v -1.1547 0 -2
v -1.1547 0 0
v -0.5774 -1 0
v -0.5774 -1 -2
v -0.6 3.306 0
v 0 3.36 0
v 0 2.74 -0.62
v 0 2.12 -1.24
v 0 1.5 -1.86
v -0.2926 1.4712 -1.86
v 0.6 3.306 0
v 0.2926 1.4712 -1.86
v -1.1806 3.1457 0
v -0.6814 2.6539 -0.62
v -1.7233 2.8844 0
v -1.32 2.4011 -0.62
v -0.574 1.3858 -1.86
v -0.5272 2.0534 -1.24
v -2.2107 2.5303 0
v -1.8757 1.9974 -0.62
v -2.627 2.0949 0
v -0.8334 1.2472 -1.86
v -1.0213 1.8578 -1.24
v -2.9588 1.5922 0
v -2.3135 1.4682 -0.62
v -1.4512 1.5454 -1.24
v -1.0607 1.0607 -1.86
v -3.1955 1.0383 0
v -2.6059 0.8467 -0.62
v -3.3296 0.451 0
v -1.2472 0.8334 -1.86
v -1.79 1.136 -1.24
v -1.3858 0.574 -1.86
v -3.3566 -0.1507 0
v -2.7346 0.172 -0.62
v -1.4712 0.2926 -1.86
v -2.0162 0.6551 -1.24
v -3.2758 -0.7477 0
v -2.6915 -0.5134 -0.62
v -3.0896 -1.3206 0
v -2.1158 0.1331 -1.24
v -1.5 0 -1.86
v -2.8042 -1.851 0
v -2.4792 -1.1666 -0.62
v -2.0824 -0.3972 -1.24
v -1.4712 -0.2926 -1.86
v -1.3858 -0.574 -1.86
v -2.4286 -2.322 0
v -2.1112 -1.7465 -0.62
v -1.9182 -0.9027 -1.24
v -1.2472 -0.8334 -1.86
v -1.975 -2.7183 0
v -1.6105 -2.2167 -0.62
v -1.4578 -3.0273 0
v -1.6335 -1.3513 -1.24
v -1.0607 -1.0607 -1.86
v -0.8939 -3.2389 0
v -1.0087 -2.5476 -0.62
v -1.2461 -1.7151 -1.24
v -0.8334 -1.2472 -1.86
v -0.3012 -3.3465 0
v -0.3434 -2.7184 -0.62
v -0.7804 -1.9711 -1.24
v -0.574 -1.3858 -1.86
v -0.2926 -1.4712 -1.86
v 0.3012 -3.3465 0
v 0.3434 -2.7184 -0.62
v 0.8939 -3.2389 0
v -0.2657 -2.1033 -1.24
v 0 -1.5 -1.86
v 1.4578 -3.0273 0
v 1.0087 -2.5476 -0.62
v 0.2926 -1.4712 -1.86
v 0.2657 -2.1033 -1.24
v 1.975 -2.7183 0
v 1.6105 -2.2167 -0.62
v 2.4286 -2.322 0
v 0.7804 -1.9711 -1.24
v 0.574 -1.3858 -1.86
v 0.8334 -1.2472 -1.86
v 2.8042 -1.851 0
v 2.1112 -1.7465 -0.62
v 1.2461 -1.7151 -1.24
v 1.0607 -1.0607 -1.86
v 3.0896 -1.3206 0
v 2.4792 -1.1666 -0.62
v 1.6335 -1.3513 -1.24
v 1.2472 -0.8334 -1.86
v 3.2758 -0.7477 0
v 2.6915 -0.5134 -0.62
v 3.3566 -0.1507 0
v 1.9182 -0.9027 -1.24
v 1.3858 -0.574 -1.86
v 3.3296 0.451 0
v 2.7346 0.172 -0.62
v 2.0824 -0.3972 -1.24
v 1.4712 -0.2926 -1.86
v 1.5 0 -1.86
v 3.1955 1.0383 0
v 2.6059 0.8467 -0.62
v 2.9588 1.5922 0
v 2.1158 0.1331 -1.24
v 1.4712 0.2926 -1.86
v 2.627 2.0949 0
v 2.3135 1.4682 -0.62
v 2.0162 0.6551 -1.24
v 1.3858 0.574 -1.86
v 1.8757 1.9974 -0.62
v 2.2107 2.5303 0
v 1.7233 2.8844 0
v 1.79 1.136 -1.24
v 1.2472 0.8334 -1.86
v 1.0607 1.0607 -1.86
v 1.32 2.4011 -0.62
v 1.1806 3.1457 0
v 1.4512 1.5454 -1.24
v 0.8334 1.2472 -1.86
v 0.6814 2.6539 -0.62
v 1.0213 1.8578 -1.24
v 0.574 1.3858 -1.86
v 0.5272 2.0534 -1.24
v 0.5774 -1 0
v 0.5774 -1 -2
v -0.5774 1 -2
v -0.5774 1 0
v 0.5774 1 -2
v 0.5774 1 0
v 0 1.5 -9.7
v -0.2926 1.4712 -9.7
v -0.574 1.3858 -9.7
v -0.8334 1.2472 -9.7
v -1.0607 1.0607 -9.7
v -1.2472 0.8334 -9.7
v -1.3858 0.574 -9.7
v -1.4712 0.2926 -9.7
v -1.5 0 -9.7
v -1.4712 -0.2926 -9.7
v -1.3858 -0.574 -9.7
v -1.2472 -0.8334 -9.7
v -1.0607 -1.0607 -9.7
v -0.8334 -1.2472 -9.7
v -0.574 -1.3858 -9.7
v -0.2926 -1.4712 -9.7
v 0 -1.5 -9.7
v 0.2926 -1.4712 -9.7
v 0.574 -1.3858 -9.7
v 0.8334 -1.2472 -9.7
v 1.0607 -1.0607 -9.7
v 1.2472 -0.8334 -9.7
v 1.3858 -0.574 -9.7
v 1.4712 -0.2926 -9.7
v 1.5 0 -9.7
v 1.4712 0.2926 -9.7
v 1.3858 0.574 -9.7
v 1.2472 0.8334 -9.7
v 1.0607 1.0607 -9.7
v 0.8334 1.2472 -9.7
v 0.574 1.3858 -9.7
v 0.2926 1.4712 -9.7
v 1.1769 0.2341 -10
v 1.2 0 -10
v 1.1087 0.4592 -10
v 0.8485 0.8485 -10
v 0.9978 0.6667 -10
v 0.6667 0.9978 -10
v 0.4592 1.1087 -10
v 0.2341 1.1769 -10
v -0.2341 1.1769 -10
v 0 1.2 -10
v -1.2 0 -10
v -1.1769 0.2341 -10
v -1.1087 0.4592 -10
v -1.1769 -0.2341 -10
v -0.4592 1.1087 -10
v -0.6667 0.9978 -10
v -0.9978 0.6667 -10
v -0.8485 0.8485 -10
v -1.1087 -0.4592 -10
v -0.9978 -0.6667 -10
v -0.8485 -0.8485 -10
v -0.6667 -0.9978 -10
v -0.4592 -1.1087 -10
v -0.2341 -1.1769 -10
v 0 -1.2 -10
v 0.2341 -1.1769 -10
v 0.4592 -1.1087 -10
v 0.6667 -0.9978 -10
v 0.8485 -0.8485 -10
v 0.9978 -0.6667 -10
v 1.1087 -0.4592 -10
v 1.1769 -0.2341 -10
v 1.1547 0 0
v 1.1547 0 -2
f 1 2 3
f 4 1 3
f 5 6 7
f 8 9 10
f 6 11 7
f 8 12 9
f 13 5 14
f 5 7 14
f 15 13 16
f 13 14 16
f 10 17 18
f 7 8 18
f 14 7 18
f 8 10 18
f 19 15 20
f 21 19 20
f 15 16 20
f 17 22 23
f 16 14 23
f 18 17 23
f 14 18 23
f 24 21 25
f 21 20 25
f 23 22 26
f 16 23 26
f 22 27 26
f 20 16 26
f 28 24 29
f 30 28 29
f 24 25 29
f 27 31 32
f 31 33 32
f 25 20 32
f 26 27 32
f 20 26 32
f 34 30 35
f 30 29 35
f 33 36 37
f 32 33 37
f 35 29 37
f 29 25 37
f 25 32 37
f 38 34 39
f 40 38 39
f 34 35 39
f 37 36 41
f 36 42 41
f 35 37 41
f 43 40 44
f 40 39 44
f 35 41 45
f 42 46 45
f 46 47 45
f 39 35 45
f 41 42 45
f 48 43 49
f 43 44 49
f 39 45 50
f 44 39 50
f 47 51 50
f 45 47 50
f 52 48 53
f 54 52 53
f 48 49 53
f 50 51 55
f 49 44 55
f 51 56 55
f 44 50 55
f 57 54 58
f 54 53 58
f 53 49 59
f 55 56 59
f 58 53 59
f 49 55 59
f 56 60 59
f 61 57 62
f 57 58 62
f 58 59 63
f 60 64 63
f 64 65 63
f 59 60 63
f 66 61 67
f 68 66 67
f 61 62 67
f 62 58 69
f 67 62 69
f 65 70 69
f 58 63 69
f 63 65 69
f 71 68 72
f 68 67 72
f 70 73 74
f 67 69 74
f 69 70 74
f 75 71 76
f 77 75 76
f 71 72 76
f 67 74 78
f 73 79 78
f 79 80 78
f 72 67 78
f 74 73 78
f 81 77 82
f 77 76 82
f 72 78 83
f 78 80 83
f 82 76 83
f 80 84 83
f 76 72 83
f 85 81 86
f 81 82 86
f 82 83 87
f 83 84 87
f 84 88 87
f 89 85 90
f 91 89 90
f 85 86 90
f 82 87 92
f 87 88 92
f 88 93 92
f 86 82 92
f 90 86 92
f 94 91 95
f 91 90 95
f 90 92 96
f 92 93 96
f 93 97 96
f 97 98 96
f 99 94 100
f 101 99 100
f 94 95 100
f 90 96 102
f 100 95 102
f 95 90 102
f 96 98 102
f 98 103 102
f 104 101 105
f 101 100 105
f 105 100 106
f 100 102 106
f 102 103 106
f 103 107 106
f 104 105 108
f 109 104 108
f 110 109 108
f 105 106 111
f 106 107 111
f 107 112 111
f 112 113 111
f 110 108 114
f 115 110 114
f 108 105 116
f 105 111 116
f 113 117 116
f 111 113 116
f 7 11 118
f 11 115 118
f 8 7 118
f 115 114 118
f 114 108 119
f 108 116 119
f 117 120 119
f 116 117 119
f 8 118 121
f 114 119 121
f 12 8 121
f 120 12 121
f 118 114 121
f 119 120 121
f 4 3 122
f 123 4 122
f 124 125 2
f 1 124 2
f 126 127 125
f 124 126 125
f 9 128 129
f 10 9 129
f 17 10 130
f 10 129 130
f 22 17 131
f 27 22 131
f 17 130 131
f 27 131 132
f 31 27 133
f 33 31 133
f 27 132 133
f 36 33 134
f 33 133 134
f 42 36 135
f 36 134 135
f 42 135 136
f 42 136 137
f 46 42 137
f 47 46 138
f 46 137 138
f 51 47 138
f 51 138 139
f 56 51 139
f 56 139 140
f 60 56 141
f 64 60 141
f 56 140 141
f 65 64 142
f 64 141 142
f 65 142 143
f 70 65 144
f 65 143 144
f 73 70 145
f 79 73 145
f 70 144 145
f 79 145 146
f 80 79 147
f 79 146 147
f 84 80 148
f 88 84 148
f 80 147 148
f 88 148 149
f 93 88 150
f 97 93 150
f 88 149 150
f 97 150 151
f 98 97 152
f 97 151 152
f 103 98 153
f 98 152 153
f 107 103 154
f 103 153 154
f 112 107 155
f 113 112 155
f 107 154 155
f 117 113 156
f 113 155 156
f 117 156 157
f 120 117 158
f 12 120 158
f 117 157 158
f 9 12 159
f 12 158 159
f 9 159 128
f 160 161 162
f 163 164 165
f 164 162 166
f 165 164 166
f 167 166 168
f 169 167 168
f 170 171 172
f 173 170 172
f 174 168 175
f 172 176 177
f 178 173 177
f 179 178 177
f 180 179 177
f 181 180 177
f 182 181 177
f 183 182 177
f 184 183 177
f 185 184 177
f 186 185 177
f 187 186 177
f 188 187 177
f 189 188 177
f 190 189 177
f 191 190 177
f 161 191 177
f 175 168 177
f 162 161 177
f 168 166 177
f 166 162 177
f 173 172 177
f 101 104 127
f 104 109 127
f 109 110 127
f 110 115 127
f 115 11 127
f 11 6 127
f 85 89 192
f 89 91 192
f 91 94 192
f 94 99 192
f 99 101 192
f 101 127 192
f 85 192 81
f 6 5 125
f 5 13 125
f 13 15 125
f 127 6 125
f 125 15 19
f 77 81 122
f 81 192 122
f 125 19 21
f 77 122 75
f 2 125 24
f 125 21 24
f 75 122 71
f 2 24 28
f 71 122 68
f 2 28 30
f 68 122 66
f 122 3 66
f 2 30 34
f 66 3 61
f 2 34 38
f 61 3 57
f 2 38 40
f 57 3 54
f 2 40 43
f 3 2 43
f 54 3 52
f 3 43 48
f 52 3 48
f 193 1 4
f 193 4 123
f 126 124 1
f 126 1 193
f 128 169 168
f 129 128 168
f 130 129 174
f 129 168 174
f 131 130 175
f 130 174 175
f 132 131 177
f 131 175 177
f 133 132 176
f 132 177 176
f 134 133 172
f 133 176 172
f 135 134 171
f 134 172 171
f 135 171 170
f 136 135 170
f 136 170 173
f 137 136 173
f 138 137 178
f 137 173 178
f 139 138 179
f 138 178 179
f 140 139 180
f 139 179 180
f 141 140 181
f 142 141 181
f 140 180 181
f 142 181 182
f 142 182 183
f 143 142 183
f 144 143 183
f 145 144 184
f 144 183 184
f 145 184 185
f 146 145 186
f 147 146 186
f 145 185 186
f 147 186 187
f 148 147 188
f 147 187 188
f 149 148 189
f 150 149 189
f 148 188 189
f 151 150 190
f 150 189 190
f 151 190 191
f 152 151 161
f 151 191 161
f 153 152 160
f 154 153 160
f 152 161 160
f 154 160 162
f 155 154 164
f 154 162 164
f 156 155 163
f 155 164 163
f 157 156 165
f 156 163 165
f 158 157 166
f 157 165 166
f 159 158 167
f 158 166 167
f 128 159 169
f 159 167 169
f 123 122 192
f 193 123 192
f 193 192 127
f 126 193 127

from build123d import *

# Parameters (mm, degrees)
CUT_EXTRUDE_1_DEPTH = 2
CHAMFER_1_SIZE      = 0.3


with BuildPart() as part:
    # Эскиз1 → Повернуть1 (revolve)
    with BuildSketch(Plane(origin=(0, 0, 0), x_dir=(0, 0, -1), z_dir=(1, 0, 0))):
        Polygon((0, 0), (0, 3.36), (1.86, 1.5), (10, 1.5), (10, 0), align=None)
    revolve(axis=Axis((0, 0, -10), (0, 0, 1)))

    # Эскиз2 → Вырез-Вытянуть1 (cut)
    with BuildSketch(Plane.XY):
        Polygon((1.154700538, 0), (0.577350269, 1), (-0.577350269, 1), (-1.154700538, 0), (-0.577350269, -1), (0.577350269, -1), align=None)
    extrude(amount=-CUT_EXTRUDE_1_DEPTH, mode=Mode.SUBTRACT)

    # Фаска1
    chamfer_1_edges = [part.edges().sort_by_distance(p)[0] for p in [
        (0, -1.5, -10),
    ]]
    chamfer(chamfer_1_edges, length=CHAMFER_1_SIZE)


solid = part.part
